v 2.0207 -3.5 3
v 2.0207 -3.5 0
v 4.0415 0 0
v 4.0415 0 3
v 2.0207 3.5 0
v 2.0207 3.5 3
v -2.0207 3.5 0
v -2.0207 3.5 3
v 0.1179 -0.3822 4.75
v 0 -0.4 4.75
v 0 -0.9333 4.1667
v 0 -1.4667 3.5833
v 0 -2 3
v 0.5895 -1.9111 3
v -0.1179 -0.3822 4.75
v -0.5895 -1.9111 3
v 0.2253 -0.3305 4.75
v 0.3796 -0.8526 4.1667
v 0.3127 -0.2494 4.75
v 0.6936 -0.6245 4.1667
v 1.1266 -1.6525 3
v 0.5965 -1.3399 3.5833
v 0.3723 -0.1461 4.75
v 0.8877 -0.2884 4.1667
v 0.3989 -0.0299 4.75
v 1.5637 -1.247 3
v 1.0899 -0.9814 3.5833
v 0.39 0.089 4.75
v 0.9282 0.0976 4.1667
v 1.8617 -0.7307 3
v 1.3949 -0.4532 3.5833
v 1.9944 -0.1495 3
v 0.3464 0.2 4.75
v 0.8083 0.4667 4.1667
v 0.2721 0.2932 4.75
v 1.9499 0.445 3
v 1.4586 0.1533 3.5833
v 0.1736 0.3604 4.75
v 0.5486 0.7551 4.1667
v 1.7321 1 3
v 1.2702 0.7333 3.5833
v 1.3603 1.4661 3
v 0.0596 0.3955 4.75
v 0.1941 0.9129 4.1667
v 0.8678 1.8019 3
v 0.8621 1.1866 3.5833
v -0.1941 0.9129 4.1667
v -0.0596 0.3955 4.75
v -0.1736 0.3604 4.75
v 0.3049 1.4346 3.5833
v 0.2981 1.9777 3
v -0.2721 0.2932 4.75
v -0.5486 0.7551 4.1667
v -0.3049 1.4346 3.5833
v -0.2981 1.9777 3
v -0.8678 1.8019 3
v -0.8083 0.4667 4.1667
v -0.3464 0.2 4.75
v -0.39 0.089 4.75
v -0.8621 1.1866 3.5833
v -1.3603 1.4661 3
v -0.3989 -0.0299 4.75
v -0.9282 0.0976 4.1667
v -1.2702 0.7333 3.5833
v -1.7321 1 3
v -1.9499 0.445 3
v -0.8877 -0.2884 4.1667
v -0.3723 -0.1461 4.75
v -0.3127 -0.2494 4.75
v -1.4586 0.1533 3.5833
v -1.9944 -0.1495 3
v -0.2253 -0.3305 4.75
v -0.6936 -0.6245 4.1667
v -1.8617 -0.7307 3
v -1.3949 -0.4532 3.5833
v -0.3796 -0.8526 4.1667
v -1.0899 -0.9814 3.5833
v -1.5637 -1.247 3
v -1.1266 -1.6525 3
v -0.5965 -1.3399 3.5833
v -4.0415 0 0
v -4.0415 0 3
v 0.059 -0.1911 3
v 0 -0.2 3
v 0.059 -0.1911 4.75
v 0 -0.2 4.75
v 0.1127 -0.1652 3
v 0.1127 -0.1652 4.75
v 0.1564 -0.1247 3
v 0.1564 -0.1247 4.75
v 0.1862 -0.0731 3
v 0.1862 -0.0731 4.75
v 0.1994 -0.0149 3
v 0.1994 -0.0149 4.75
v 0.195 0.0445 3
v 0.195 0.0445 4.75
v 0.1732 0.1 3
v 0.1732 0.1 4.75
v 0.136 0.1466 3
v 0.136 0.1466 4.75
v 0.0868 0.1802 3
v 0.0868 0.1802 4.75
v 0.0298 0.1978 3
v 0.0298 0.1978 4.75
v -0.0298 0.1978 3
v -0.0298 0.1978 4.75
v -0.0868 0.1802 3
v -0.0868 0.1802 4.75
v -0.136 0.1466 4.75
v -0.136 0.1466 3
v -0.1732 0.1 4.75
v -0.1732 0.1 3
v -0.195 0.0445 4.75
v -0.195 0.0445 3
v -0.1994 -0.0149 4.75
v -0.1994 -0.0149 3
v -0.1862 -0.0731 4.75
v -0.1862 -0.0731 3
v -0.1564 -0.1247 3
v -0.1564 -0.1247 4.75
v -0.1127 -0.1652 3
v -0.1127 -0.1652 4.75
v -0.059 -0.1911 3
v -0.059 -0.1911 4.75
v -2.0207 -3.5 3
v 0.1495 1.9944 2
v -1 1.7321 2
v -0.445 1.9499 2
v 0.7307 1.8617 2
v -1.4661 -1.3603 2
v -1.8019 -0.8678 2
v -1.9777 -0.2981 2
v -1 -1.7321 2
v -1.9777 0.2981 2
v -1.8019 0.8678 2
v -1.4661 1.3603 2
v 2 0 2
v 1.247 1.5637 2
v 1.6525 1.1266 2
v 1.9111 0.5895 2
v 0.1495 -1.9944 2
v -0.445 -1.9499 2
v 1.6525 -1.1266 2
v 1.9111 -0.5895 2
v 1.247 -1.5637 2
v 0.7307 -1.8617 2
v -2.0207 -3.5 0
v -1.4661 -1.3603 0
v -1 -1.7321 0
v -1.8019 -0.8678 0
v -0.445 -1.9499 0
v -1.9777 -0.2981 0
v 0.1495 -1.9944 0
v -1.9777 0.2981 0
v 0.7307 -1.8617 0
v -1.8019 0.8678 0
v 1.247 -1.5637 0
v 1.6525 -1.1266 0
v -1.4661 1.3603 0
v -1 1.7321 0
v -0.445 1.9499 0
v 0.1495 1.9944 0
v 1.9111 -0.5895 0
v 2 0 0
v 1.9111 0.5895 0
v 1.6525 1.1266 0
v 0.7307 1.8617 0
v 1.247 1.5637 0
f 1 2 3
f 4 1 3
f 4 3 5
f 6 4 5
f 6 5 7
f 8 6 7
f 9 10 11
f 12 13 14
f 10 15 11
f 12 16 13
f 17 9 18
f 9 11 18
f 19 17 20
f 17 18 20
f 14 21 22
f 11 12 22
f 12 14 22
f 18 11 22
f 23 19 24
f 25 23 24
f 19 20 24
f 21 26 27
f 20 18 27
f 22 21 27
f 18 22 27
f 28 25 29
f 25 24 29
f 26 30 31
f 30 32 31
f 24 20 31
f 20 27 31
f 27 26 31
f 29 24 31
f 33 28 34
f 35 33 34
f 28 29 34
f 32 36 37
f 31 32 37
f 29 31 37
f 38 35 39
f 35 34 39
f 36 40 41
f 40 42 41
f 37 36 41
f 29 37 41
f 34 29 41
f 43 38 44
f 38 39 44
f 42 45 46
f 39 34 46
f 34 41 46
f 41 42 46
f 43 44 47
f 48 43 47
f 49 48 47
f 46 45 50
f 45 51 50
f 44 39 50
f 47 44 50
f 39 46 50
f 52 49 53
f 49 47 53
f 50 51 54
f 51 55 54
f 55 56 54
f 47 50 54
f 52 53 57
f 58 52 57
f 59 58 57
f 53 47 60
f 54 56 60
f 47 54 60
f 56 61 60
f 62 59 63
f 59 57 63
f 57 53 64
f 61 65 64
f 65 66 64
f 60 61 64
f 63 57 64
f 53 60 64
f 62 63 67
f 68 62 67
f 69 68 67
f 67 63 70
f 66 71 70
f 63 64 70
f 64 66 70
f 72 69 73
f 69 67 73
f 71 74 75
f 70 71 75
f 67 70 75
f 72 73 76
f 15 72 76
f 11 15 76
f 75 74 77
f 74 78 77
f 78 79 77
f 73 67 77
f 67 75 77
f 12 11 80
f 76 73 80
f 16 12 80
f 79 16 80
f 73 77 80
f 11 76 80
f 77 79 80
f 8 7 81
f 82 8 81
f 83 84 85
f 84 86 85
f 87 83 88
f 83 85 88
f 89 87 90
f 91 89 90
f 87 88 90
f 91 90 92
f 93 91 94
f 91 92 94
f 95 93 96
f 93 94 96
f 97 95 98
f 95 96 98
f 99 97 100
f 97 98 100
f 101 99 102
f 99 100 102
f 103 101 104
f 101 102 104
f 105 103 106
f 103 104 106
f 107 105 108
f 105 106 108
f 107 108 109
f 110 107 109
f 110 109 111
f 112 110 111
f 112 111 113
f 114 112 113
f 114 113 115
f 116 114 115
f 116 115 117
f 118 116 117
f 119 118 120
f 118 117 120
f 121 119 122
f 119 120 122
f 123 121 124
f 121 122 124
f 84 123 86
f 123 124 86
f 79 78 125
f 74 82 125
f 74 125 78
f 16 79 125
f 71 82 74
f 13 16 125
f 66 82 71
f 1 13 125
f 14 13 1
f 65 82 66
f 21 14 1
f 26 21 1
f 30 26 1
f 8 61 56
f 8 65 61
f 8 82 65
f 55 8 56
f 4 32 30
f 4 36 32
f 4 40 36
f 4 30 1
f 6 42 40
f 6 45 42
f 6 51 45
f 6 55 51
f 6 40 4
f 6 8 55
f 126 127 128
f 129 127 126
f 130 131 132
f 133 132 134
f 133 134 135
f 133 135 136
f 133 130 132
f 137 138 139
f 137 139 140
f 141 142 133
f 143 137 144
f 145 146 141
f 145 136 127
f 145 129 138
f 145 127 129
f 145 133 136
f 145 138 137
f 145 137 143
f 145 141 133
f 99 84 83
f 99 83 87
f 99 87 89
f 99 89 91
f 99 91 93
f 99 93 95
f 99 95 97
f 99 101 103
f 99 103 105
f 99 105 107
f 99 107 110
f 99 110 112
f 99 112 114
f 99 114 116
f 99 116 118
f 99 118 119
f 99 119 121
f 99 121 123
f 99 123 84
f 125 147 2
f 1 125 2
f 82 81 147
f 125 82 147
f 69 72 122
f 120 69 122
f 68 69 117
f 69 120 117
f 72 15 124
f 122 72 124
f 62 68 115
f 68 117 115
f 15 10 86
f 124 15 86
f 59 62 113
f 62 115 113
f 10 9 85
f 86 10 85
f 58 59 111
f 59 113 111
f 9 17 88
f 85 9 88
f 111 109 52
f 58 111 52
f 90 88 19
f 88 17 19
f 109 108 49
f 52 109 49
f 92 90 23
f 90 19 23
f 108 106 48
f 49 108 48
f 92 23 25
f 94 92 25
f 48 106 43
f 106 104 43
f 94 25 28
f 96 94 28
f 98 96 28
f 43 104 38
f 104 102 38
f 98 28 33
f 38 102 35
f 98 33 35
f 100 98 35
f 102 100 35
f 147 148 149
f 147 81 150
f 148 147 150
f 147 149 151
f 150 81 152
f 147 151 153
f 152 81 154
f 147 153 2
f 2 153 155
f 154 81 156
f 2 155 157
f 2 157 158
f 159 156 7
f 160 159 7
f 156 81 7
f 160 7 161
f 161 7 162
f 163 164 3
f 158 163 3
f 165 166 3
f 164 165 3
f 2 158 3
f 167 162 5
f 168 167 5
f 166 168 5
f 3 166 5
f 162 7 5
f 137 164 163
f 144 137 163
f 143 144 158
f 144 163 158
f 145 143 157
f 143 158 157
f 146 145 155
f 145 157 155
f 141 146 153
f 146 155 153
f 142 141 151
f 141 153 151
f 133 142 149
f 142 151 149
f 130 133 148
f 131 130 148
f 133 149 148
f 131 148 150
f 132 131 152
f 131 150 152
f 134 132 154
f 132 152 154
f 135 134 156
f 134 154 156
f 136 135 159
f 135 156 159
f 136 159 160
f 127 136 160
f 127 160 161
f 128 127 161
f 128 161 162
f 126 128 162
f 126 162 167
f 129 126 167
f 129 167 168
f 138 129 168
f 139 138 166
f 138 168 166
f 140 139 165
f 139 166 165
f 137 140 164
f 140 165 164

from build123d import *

# Parameters (mm, degrees)
F1_DEPTH = 3
F4_R     = 2
F5_DEPTH = 2


with BuildPart() as f1:
    # F0 (on Top) → F1 (new body)
    with BuildSketch(Plane.XY):
        Polygon((2.020726, -3.5), (4.041452, 0), (2.020726, 3.5), (-2.020726, 3.5), (-4.041452, 0), (-2.020726, -3.5), align=None)
    extrude(amount=F1_DEPTH)

    # F2 (on Right) → F3 (revolve)
    with BuildSketch(Plane.YZ):
        Polygon((-0.4, 4.75), (-2, 3), (-0.2, 3), (-0.2, 4.75), align=None)
    revolve(axis=Axis((0, 0, 3.308563), (0, 0, 1)))

    # F4 (on face) → F5 (cut)
    with BuildSketch(Plane(origin=(0, 0, 0), x_dir=(1, 0, 0), z_dir=(0, 0, -1))):
        Circle(F4_R)
    extrude(amount=-F5_DEPTH, mode=Mode.SUBTRACT)


solid = f1.part
